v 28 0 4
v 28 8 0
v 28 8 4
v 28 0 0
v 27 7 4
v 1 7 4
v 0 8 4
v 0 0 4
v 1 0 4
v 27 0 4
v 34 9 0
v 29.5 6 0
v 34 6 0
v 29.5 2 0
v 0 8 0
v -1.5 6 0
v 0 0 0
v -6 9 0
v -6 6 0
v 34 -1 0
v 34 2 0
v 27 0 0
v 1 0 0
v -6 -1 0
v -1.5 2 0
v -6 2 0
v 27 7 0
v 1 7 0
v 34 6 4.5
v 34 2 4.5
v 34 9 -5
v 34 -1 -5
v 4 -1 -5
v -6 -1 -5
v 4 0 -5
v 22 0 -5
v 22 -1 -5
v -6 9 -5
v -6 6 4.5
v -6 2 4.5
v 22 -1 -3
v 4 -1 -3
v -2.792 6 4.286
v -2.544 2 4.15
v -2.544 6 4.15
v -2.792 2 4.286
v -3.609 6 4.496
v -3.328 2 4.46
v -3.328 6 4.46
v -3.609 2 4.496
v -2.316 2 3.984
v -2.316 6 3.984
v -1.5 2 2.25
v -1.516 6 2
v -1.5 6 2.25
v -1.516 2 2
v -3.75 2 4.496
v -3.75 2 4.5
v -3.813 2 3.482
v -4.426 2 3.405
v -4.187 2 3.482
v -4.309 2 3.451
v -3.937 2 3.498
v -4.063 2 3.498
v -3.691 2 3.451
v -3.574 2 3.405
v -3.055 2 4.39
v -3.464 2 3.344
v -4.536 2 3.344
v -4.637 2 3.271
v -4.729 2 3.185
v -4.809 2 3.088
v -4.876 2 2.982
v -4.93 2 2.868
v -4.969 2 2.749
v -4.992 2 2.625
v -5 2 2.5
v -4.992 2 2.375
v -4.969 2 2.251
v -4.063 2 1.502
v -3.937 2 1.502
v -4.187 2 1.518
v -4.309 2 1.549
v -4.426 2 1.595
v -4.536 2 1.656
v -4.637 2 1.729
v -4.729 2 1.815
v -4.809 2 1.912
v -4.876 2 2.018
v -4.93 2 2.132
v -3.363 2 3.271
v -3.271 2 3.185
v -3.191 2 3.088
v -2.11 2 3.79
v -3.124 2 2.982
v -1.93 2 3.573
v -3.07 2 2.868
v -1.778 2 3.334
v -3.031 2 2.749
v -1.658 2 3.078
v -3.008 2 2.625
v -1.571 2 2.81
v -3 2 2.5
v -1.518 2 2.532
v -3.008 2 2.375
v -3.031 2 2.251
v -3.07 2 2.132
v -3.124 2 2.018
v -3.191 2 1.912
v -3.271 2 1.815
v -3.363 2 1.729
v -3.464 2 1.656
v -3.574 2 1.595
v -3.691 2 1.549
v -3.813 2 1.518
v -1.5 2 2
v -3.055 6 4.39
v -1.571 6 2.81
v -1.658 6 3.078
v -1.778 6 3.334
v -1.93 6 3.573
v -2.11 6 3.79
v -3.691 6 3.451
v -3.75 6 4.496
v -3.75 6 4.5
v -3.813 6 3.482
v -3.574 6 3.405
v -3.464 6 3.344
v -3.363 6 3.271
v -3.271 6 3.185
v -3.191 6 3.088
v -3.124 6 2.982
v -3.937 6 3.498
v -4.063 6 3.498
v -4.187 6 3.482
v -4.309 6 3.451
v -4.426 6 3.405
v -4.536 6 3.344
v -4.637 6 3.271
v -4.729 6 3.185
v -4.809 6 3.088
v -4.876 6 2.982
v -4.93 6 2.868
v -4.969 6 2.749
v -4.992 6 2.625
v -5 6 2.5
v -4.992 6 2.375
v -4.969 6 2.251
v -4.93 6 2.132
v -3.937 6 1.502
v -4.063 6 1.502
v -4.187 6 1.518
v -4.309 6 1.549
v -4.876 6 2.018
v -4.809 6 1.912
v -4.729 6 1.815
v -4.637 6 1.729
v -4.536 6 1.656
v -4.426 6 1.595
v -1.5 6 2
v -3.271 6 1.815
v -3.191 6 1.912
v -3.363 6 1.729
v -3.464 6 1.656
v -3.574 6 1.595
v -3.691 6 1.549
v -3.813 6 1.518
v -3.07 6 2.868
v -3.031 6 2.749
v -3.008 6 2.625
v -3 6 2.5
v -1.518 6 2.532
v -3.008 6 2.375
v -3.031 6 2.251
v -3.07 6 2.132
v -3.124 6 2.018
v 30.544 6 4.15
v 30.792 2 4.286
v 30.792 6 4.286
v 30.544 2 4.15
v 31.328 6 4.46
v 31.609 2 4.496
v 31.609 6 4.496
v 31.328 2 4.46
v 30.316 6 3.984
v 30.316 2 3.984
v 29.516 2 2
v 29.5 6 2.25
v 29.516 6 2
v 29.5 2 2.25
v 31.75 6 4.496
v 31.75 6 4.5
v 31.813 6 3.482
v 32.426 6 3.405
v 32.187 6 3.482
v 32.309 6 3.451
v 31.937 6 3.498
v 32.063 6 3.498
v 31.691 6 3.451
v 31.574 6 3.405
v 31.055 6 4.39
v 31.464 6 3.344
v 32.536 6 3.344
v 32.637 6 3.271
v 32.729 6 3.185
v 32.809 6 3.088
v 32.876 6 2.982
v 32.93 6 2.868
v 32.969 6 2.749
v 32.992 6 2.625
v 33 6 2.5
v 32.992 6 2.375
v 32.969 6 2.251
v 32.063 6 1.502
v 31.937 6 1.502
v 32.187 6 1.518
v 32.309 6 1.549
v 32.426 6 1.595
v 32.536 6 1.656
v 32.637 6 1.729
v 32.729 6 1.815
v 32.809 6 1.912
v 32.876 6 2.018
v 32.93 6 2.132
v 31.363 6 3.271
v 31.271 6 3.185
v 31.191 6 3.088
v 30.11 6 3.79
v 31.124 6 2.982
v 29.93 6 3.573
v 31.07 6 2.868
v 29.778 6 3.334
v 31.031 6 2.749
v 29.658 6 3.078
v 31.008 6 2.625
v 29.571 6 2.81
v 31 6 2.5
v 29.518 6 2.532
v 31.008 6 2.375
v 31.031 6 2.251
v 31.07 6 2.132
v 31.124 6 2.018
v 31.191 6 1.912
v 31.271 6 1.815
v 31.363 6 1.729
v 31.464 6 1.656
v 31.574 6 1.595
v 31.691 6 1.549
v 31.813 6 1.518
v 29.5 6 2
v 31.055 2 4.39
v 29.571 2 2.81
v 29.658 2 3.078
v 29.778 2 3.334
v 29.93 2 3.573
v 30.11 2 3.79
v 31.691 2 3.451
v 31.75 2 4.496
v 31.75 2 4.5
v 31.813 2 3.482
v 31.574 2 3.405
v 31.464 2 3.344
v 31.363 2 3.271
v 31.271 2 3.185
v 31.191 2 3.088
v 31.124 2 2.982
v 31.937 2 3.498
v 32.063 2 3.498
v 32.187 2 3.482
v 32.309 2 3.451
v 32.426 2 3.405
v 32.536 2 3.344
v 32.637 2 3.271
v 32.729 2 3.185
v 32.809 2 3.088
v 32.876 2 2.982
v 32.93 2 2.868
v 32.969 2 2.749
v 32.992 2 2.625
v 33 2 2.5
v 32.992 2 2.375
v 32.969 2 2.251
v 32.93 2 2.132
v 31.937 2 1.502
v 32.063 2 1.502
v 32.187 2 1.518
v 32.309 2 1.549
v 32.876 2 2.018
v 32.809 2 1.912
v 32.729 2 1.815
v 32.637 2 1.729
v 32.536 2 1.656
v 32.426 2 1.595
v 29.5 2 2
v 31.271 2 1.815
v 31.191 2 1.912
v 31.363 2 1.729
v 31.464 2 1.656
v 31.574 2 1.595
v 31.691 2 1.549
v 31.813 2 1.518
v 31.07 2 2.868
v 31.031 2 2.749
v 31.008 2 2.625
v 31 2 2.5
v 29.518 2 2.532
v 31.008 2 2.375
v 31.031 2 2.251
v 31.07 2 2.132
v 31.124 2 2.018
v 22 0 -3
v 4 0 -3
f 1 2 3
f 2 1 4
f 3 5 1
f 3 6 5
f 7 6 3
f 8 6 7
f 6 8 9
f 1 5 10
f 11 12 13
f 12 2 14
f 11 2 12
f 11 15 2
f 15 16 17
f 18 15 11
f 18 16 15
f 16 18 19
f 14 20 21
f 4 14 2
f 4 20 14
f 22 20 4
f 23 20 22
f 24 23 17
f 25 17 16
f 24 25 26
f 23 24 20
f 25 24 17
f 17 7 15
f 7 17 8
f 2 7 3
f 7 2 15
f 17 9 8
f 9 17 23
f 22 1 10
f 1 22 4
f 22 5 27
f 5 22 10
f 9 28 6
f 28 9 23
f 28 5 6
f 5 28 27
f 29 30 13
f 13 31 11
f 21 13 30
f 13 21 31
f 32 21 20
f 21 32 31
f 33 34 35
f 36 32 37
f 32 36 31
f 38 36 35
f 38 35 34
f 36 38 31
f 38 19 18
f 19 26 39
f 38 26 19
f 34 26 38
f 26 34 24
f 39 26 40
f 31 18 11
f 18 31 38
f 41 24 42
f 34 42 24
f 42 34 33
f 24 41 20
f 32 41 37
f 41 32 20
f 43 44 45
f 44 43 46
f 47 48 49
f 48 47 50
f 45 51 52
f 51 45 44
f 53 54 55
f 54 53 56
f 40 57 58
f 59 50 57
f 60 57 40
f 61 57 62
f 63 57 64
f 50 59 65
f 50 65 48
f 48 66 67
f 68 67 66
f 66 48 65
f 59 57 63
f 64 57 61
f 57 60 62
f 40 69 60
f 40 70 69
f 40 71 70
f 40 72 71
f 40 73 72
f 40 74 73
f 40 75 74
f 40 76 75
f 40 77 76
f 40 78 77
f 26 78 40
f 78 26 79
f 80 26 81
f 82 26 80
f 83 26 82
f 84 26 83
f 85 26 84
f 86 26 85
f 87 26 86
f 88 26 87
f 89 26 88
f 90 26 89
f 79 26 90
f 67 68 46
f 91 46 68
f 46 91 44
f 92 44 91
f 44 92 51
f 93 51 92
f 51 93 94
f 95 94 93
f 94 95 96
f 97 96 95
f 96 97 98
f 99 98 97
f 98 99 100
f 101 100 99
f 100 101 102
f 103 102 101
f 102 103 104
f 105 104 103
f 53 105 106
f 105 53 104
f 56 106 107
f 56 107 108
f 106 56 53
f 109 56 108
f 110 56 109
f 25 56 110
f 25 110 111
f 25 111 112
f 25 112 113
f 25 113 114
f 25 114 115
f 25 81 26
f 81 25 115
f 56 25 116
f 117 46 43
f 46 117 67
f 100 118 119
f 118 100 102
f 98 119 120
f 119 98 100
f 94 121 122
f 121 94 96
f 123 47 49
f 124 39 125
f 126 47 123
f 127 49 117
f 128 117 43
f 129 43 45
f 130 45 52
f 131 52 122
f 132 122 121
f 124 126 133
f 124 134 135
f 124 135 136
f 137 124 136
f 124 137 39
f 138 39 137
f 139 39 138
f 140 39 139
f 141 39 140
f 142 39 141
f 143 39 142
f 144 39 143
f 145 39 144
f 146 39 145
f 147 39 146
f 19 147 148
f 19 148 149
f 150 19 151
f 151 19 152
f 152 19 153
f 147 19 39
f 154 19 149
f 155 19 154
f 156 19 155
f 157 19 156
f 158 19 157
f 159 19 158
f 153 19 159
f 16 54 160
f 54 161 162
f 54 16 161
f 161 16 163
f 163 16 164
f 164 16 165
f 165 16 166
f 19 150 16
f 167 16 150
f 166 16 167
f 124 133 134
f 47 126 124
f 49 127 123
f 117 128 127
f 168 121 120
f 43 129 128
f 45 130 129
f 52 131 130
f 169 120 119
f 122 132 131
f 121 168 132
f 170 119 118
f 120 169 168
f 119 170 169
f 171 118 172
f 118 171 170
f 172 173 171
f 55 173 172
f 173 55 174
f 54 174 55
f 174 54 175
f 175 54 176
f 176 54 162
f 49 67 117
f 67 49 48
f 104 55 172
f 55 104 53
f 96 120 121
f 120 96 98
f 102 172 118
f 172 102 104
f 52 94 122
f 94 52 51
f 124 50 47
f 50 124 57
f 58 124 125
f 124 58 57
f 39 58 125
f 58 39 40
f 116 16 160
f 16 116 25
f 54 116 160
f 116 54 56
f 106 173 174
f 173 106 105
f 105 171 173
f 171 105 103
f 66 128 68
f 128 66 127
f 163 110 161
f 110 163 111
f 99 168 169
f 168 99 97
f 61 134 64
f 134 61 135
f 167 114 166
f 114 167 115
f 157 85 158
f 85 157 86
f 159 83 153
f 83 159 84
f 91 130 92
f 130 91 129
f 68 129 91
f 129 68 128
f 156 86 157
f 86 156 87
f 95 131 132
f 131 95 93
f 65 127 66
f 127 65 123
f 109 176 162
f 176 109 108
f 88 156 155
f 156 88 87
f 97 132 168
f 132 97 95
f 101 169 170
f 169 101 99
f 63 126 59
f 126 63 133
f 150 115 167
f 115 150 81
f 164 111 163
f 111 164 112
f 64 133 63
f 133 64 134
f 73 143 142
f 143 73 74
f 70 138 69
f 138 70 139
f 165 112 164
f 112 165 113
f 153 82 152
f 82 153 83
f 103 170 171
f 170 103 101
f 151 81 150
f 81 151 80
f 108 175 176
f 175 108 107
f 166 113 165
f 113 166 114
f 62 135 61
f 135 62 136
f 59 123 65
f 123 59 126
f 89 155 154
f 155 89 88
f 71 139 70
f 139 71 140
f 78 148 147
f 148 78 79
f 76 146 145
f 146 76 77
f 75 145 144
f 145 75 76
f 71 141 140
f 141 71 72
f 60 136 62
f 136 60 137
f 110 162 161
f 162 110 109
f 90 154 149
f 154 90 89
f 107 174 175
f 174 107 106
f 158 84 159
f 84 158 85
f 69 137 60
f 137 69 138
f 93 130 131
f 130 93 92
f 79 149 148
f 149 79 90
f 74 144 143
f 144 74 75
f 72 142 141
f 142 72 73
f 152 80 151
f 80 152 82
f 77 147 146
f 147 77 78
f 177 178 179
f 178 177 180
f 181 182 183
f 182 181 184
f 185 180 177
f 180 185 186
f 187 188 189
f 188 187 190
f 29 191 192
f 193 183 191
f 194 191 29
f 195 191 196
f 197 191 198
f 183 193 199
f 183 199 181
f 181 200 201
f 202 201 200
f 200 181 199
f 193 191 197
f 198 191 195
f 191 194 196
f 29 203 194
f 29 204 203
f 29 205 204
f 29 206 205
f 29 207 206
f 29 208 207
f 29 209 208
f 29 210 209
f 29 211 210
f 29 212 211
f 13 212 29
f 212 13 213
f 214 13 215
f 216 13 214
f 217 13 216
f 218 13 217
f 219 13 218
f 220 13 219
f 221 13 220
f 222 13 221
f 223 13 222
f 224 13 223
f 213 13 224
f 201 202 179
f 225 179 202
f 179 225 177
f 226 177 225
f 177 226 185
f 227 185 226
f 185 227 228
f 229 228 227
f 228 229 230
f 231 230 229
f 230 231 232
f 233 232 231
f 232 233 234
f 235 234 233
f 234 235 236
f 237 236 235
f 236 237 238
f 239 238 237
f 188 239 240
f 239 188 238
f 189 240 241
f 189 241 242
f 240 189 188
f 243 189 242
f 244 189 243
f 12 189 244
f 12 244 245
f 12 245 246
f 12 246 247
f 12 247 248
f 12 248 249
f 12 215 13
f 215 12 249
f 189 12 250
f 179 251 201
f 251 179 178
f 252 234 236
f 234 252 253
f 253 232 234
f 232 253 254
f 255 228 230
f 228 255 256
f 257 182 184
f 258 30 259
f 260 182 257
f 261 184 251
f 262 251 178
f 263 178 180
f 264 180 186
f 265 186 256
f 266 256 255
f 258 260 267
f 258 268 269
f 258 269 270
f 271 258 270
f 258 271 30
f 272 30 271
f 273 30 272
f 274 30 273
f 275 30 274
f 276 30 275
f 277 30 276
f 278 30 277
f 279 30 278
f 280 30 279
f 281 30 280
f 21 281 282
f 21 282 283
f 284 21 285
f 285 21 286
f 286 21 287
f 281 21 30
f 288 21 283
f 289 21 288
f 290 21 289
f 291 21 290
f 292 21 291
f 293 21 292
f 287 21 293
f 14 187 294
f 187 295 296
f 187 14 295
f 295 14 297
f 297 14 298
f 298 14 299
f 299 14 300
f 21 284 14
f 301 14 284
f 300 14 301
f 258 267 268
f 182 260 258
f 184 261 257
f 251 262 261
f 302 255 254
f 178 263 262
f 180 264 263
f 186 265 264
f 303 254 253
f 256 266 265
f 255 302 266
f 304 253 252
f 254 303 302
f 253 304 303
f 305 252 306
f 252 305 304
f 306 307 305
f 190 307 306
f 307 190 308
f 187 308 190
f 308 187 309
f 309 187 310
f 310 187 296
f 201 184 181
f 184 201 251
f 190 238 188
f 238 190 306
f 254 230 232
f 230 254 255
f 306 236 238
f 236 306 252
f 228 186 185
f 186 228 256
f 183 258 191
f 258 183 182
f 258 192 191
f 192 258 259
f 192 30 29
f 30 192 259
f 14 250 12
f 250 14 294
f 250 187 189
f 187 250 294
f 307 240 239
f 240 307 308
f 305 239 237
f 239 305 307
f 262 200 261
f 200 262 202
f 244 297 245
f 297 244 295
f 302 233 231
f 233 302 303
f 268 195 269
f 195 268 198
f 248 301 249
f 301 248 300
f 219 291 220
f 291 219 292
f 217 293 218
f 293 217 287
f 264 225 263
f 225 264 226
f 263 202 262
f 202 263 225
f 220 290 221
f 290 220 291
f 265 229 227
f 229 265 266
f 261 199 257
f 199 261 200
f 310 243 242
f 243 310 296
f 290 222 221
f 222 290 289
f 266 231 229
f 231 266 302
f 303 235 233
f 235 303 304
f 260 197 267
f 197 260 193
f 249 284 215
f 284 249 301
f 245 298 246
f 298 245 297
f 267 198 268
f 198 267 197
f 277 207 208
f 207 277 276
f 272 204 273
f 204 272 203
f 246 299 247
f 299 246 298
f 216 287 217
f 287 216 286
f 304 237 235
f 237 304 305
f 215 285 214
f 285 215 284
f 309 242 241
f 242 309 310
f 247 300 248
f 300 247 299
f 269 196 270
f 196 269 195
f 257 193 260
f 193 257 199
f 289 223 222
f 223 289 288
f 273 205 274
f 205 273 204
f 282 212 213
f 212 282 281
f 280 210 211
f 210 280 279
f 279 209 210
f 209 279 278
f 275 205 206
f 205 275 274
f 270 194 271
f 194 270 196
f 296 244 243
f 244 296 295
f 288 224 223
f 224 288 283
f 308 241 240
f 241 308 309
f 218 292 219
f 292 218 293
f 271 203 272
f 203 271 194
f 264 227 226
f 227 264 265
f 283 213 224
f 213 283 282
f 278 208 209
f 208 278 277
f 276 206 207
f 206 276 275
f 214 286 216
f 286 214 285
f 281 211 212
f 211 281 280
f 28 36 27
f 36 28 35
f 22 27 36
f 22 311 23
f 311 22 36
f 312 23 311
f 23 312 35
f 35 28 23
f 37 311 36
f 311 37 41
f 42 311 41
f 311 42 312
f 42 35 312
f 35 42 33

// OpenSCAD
module main_body() {
    external_h = 5;
    union() {
        difference() {
            cube([28, 8, 4]);
            translate([1, 0, 0])
                cube([26, 7, 4]);
        };
        translate([-6,-1,-external_h]) {
            cube([40, 10, external_h]);
        }
    }
}

module connector() {
    difference() {
        intersection(){
            cube([4.5,4,4.5]);
            union() {
                translate([2.25,0,2.25])
                    rotate([-90, 0, 0])
                        cylinder(r = 2.25, h=4);
                cube([2.25,4,4.5]);
                cube([4.5,4,2]);
            }
        }
        translate([2,0,2.5])
        rotate([-90, 0, 0])
            cylinder(d=2, h = 4);
    }
}

module connectors() {
    translate([-6, 2, 0]) {
        connector();
    }
    translate([40-6, 2+4, 0]){
        rotate([0,0,180])
            connector();
    }
}

module air_path_left() {
    window_h = 2;
    window_x = 18;
    internal_h = 5;

    points = [ [5, 0, 0], //0
               [5+window_x, 0, 0], //1
               //[5+window_x, 0, window_h],
               //[5, 0, window_h],

               [0, 7, internal_h],  //2
               [26, 7, internal_h], //3

               [0, 0, internal_h],  //4
               [26, 0, internal_h]]; //5
    faces = [ [0, 1, 3, 2],
              [0, 2, 4],
              [2, 3, 5, 4],
              [3, 1, 5],
              [0, 4, 5, 1]];
    union() {
        polyhedron(points, faces);
        translate([5, -1, 0])
            cube([window_x, 1, window_h]);
    }
    
}
module air_path_right() {
    window_h = 2;
    window_x = 18;
    internal_h = 5;

    points = [ [26 - window_x - 5, 0, 0], //0
               [26 - 5, 0, 0], //1
               //[5+window_x, 0, window_h],
               //[5, 0, window_h],

               [0, 7, internal_h],  //2
               [26, 7, internal_h], //3

               [0, 0, internal_h],  //4
               [26, 0, internal_h]]; //5
    faces = [ [0, 1, 3, 2],
              [0, 2, 4],
              [2, 3, 5, 4],
              [3, 1, 5],
              [0, 4, 5, 1]];
    union() {
        polyhedron(points, faces);
        translate([26 - window_x - 5, -1, 0])
            cube([window_x, 1, window_h]);
    }
}
$fn = 50;

difference() {
    union() {
        main_body();
        connectors();
    };
    translate([1, 0, -5])
        //air_path_left();
        air_path_right();
}
